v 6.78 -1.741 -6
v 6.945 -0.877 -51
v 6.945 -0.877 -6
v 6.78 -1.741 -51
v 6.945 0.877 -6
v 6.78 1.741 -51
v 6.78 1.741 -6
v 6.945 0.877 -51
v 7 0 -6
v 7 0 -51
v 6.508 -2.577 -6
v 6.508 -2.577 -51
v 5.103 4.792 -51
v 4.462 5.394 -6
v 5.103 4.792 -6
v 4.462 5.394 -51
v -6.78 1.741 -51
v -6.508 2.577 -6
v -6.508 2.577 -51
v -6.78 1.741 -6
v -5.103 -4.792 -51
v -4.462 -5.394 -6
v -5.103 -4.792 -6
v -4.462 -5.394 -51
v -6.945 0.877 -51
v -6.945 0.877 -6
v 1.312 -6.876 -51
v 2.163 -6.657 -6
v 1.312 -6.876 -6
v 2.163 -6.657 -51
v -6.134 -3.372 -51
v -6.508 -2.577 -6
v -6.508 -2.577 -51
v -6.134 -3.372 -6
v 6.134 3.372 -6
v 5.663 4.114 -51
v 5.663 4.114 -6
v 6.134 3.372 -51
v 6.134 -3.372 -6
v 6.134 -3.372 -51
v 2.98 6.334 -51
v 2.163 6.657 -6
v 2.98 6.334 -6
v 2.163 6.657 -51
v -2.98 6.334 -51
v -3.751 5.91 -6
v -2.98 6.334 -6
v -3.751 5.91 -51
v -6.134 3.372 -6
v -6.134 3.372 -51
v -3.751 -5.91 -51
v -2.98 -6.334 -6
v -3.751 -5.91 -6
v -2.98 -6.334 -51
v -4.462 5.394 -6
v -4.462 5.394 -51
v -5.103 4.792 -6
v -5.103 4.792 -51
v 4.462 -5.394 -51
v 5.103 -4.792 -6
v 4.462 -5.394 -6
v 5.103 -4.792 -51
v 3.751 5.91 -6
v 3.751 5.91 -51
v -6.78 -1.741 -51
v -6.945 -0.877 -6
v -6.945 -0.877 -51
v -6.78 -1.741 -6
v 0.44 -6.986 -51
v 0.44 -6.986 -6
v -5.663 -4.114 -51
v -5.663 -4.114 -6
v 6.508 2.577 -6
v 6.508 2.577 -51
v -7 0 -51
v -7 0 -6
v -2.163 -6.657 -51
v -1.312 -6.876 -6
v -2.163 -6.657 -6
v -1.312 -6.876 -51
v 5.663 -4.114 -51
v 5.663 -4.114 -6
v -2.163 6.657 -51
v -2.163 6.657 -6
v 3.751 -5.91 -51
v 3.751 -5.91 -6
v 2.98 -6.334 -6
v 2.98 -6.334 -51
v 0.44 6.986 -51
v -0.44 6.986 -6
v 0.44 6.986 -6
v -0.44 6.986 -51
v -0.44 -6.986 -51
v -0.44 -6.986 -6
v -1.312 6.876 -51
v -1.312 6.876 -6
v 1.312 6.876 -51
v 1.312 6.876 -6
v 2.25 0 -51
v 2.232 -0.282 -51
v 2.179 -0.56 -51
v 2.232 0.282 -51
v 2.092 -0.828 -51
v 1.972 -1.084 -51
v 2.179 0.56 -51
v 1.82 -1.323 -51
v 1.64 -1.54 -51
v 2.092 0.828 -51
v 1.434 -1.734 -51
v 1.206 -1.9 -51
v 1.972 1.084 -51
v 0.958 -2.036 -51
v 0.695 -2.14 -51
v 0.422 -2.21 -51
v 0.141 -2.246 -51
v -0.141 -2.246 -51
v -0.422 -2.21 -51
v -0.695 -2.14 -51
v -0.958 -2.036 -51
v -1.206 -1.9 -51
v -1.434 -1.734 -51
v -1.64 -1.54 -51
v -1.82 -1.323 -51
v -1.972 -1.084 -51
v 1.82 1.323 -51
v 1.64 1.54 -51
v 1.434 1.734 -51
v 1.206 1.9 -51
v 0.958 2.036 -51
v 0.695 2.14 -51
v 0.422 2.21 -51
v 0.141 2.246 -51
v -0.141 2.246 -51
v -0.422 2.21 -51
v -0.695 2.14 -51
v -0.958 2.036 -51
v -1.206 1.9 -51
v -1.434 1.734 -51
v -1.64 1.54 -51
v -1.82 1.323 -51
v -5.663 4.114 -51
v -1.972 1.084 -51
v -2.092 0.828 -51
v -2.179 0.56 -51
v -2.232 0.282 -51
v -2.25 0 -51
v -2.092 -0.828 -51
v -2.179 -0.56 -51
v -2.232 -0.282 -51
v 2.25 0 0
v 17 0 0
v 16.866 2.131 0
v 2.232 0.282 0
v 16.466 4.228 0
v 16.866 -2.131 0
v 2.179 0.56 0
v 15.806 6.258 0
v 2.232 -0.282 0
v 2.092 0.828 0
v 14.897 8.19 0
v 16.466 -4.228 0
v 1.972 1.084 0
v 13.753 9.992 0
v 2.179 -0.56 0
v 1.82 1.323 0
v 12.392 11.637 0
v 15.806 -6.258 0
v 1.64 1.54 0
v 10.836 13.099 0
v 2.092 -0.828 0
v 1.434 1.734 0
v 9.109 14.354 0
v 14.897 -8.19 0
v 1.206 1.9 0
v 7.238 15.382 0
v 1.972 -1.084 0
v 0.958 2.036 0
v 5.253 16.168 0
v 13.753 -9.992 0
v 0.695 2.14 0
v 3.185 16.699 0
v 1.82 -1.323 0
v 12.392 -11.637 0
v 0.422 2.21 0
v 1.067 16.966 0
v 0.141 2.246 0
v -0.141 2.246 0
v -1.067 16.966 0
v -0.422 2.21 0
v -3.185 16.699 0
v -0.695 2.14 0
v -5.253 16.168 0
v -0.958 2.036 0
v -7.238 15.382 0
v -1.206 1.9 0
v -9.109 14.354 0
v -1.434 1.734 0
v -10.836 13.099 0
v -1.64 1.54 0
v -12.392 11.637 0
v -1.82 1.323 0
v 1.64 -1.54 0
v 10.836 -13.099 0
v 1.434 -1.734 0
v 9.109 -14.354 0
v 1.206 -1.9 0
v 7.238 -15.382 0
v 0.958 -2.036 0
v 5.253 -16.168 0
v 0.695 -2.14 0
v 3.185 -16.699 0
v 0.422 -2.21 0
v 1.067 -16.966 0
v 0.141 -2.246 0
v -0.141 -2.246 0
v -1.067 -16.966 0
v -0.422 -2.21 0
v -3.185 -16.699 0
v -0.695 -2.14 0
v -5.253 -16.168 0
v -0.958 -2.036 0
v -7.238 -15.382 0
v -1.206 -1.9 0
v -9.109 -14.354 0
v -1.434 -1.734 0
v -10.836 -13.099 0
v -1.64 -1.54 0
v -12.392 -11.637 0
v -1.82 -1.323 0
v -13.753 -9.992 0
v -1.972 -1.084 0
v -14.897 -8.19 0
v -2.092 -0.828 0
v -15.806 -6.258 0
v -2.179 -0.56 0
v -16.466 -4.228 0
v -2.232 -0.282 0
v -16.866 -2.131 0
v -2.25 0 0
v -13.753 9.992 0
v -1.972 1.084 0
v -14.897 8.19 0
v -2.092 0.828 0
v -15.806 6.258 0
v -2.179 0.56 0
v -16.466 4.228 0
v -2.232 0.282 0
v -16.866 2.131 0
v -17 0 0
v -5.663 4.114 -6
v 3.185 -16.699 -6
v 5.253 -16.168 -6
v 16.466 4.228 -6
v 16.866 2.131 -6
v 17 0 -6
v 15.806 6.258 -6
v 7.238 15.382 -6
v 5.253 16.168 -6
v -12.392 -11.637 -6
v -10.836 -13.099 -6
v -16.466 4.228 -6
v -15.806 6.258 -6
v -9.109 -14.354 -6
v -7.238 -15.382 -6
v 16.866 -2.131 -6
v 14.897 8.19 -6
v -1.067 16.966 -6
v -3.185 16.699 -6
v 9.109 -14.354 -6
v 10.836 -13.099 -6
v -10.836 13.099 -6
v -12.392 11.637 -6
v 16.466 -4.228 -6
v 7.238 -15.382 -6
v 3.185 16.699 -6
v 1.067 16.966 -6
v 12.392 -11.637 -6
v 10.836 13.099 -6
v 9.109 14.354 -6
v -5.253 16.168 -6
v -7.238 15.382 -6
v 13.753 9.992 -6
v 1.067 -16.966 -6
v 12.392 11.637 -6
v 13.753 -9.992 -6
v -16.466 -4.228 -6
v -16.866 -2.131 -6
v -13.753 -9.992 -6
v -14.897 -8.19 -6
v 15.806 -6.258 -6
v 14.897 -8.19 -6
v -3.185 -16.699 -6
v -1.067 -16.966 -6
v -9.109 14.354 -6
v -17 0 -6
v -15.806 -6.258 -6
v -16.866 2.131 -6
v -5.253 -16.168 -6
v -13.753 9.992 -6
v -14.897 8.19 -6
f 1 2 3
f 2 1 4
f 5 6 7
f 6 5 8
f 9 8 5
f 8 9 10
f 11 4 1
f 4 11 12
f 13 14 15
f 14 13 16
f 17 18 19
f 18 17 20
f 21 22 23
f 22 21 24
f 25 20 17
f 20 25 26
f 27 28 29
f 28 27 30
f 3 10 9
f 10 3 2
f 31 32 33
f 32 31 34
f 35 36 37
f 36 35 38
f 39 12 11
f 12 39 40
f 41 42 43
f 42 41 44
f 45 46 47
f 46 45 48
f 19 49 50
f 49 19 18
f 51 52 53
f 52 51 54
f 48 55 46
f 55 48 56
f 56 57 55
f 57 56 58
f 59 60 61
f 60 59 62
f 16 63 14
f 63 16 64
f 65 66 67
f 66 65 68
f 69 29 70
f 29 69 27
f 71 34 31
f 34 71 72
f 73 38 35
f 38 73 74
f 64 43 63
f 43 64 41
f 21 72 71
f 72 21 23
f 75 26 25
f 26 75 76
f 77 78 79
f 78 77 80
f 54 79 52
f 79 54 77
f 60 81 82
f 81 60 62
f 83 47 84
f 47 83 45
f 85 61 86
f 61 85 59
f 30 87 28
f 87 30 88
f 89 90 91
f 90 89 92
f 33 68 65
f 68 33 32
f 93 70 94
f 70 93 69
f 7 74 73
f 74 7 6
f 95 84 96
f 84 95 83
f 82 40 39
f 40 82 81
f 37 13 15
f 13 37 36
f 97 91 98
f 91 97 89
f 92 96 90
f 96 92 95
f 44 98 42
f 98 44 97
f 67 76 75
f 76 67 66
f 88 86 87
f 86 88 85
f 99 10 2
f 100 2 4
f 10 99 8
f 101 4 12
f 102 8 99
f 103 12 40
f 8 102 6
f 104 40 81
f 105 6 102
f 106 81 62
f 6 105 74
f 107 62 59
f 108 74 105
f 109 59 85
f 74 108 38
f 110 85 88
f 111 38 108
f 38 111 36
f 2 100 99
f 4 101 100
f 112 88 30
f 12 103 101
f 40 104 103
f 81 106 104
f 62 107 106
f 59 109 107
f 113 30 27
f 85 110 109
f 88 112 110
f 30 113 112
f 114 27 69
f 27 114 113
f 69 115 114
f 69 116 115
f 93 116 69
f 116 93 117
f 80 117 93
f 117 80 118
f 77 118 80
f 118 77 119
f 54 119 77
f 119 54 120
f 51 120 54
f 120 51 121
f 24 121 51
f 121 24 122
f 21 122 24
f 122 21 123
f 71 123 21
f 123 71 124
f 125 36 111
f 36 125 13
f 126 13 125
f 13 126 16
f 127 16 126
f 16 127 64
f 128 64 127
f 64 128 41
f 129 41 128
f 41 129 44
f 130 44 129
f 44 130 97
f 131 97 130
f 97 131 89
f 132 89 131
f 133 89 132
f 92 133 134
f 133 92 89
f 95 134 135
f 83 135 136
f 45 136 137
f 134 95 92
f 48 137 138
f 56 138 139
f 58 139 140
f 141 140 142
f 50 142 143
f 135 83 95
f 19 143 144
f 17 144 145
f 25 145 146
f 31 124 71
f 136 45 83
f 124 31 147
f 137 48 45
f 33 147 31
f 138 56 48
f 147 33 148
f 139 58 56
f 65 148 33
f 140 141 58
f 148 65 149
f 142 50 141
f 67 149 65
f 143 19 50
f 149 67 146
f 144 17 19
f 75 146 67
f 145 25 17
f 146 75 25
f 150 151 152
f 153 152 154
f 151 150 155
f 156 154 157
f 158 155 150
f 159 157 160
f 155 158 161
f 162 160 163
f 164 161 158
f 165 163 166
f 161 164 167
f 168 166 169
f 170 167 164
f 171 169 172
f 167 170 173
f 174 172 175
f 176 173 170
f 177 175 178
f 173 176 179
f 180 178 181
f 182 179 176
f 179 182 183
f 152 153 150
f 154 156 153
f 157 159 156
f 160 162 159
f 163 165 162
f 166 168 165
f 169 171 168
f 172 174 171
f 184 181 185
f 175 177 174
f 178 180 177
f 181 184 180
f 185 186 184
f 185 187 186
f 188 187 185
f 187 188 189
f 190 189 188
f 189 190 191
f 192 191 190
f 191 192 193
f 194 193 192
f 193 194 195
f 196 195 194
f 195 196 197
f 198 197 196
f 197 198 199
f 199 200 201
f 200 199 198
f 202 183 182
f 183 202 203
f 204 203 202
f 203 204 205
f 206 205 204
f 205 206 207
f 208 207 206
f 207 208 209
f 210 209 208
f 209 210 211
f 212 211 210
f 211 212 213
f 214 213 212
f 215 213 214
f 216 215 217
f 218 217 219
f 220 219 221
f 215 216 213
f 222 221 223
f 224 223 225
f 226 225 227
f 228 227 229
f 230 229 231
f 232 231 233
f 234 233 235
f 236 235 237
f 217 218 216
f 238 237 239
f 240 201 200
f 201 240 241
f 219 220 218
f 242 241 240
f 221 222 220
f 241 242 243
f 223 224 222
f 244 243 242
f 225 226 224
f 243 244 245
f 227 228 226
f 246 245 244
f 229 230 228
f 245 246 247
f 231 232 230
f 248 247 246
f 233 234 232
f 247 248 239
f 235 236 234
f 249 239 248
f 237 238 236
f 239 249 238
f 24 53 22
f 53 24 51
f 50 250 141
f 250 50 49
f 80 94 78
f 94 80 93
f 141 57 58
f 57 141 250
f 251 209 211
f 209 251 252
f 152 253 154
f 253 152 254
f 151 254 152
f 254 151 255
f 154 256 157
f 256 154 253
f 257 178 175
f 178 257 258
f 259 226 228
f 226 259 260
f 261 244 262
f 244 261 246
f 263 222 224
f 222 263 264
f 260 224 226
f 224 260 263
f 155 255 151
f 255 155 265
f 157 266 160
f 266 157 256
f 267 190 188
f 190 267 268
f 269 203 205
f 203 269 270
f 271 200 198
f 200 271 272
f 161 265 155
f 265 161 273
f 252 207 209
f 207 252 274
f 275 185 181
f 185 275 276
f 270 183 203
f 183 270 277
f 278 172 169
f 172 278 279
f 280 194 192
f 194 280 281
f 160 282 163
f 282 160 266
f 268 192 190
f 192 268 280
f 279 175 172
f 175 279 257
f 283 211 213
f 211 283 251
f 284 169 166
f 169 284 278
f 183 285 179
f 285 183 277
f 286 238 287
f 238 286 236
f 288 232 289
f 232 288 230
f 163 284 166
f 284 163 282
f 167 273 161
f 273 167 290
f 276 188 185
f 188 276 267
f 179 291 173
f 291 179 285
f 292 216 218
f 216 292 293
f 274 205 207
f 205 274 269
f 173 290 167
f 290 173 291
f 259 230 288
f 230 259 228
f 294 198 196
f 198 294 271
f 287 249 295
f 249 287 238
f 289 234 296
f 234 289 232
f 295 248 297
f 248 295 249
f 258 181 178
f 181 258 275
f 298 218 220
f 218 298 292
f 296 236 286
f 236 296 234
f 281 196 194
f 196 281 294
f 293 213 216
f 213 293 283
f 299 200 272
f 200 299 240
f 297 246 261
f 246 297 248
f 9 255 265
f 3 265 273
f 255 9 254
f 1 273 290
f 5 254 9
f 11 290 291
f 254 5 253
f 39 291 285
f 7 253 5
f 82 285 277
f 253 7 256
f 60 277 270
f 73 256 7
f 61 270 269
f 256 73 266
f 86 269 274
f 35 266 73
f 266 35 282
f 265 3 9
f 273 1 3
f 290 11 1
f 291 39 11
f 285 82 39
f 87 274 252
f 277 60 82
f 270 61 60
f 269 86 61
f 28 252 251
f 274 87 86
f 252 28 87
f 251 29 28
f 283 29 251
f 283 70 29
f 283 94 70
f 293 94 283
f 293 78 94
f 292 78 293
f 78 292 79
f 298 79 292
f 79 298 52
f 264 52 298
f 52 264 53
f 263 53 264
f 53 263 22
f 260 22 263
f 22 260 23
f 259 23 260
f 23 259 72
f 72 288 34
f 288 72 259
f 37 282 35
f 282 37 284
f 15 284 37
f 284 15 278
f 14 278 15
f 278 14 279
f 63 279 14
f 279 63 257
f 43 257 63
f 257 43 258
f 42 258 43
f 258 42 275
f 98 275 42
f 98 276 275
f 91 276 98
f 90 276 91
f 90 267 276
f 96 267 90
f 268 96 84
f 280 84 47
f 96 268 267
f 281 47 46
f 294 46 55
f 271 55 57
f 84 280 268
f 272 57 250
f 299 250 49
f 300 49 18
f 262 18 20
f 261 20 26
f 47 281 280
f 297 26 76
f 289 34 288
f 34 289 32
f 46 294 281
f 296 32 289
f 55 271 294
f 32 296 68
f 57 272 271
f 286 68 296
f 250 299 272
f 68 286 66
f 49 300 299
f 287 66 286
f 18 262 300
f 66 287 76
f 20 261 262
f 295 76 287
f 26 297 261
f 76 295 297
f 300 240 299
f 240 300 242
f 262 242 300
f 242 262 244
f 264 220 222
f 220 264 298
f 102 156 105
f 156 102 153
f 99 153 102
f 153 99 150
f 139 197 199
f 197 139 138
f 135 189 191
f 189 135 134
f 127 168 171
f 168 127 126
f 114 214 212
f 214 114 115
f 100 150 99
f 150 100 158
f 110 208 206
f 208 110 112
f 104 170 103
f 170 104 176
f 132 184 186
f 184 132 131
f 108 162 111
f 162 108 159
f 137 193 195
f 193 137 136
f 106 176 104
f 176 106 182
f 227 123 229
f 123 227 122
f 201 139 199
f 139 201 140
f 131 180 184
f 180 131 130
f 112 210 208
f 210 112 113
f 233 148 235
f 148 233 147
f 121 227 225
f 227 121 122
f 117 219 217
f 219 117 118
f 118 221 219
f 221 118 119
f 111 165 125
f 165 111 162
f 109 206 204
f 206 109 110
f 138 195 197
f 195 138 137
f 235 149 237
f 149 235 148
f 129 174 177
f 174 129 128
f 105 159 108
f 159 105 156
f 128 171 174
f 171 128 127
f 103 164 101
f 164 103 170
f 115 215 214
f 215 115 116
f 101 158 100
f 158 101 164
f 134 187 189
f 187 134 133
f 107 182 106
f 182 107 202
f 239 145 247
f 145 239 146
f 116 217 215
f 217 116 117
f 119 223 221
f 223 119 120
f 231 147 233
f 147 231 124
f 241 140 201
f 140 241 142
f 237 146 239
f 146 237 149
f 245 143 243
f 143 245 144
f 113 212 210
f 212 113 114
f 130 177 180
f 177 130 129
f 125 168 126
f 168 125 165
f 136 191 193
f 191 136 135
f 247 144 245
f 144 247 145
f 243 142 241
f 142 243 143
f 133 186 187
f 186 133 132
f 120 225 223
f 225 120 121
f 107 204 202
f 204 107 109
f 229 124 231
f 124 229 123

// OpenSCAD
$fn = 50;


difference() {
	union() {
		translate(v = [0, 0, -51.0000000000]) {
			cylinder(h = 51, r = 7.0000000000);
		}
		translate(v = [0, 0, -6.0000000000]) {
			cylinder(h = 6, r = 17.0000000000);
		}
	}
	union() {
		#translate(v = [0, 0, -51]) {
			cylinder(h = 51, r = 2.2500000000);
		}
	}
}
